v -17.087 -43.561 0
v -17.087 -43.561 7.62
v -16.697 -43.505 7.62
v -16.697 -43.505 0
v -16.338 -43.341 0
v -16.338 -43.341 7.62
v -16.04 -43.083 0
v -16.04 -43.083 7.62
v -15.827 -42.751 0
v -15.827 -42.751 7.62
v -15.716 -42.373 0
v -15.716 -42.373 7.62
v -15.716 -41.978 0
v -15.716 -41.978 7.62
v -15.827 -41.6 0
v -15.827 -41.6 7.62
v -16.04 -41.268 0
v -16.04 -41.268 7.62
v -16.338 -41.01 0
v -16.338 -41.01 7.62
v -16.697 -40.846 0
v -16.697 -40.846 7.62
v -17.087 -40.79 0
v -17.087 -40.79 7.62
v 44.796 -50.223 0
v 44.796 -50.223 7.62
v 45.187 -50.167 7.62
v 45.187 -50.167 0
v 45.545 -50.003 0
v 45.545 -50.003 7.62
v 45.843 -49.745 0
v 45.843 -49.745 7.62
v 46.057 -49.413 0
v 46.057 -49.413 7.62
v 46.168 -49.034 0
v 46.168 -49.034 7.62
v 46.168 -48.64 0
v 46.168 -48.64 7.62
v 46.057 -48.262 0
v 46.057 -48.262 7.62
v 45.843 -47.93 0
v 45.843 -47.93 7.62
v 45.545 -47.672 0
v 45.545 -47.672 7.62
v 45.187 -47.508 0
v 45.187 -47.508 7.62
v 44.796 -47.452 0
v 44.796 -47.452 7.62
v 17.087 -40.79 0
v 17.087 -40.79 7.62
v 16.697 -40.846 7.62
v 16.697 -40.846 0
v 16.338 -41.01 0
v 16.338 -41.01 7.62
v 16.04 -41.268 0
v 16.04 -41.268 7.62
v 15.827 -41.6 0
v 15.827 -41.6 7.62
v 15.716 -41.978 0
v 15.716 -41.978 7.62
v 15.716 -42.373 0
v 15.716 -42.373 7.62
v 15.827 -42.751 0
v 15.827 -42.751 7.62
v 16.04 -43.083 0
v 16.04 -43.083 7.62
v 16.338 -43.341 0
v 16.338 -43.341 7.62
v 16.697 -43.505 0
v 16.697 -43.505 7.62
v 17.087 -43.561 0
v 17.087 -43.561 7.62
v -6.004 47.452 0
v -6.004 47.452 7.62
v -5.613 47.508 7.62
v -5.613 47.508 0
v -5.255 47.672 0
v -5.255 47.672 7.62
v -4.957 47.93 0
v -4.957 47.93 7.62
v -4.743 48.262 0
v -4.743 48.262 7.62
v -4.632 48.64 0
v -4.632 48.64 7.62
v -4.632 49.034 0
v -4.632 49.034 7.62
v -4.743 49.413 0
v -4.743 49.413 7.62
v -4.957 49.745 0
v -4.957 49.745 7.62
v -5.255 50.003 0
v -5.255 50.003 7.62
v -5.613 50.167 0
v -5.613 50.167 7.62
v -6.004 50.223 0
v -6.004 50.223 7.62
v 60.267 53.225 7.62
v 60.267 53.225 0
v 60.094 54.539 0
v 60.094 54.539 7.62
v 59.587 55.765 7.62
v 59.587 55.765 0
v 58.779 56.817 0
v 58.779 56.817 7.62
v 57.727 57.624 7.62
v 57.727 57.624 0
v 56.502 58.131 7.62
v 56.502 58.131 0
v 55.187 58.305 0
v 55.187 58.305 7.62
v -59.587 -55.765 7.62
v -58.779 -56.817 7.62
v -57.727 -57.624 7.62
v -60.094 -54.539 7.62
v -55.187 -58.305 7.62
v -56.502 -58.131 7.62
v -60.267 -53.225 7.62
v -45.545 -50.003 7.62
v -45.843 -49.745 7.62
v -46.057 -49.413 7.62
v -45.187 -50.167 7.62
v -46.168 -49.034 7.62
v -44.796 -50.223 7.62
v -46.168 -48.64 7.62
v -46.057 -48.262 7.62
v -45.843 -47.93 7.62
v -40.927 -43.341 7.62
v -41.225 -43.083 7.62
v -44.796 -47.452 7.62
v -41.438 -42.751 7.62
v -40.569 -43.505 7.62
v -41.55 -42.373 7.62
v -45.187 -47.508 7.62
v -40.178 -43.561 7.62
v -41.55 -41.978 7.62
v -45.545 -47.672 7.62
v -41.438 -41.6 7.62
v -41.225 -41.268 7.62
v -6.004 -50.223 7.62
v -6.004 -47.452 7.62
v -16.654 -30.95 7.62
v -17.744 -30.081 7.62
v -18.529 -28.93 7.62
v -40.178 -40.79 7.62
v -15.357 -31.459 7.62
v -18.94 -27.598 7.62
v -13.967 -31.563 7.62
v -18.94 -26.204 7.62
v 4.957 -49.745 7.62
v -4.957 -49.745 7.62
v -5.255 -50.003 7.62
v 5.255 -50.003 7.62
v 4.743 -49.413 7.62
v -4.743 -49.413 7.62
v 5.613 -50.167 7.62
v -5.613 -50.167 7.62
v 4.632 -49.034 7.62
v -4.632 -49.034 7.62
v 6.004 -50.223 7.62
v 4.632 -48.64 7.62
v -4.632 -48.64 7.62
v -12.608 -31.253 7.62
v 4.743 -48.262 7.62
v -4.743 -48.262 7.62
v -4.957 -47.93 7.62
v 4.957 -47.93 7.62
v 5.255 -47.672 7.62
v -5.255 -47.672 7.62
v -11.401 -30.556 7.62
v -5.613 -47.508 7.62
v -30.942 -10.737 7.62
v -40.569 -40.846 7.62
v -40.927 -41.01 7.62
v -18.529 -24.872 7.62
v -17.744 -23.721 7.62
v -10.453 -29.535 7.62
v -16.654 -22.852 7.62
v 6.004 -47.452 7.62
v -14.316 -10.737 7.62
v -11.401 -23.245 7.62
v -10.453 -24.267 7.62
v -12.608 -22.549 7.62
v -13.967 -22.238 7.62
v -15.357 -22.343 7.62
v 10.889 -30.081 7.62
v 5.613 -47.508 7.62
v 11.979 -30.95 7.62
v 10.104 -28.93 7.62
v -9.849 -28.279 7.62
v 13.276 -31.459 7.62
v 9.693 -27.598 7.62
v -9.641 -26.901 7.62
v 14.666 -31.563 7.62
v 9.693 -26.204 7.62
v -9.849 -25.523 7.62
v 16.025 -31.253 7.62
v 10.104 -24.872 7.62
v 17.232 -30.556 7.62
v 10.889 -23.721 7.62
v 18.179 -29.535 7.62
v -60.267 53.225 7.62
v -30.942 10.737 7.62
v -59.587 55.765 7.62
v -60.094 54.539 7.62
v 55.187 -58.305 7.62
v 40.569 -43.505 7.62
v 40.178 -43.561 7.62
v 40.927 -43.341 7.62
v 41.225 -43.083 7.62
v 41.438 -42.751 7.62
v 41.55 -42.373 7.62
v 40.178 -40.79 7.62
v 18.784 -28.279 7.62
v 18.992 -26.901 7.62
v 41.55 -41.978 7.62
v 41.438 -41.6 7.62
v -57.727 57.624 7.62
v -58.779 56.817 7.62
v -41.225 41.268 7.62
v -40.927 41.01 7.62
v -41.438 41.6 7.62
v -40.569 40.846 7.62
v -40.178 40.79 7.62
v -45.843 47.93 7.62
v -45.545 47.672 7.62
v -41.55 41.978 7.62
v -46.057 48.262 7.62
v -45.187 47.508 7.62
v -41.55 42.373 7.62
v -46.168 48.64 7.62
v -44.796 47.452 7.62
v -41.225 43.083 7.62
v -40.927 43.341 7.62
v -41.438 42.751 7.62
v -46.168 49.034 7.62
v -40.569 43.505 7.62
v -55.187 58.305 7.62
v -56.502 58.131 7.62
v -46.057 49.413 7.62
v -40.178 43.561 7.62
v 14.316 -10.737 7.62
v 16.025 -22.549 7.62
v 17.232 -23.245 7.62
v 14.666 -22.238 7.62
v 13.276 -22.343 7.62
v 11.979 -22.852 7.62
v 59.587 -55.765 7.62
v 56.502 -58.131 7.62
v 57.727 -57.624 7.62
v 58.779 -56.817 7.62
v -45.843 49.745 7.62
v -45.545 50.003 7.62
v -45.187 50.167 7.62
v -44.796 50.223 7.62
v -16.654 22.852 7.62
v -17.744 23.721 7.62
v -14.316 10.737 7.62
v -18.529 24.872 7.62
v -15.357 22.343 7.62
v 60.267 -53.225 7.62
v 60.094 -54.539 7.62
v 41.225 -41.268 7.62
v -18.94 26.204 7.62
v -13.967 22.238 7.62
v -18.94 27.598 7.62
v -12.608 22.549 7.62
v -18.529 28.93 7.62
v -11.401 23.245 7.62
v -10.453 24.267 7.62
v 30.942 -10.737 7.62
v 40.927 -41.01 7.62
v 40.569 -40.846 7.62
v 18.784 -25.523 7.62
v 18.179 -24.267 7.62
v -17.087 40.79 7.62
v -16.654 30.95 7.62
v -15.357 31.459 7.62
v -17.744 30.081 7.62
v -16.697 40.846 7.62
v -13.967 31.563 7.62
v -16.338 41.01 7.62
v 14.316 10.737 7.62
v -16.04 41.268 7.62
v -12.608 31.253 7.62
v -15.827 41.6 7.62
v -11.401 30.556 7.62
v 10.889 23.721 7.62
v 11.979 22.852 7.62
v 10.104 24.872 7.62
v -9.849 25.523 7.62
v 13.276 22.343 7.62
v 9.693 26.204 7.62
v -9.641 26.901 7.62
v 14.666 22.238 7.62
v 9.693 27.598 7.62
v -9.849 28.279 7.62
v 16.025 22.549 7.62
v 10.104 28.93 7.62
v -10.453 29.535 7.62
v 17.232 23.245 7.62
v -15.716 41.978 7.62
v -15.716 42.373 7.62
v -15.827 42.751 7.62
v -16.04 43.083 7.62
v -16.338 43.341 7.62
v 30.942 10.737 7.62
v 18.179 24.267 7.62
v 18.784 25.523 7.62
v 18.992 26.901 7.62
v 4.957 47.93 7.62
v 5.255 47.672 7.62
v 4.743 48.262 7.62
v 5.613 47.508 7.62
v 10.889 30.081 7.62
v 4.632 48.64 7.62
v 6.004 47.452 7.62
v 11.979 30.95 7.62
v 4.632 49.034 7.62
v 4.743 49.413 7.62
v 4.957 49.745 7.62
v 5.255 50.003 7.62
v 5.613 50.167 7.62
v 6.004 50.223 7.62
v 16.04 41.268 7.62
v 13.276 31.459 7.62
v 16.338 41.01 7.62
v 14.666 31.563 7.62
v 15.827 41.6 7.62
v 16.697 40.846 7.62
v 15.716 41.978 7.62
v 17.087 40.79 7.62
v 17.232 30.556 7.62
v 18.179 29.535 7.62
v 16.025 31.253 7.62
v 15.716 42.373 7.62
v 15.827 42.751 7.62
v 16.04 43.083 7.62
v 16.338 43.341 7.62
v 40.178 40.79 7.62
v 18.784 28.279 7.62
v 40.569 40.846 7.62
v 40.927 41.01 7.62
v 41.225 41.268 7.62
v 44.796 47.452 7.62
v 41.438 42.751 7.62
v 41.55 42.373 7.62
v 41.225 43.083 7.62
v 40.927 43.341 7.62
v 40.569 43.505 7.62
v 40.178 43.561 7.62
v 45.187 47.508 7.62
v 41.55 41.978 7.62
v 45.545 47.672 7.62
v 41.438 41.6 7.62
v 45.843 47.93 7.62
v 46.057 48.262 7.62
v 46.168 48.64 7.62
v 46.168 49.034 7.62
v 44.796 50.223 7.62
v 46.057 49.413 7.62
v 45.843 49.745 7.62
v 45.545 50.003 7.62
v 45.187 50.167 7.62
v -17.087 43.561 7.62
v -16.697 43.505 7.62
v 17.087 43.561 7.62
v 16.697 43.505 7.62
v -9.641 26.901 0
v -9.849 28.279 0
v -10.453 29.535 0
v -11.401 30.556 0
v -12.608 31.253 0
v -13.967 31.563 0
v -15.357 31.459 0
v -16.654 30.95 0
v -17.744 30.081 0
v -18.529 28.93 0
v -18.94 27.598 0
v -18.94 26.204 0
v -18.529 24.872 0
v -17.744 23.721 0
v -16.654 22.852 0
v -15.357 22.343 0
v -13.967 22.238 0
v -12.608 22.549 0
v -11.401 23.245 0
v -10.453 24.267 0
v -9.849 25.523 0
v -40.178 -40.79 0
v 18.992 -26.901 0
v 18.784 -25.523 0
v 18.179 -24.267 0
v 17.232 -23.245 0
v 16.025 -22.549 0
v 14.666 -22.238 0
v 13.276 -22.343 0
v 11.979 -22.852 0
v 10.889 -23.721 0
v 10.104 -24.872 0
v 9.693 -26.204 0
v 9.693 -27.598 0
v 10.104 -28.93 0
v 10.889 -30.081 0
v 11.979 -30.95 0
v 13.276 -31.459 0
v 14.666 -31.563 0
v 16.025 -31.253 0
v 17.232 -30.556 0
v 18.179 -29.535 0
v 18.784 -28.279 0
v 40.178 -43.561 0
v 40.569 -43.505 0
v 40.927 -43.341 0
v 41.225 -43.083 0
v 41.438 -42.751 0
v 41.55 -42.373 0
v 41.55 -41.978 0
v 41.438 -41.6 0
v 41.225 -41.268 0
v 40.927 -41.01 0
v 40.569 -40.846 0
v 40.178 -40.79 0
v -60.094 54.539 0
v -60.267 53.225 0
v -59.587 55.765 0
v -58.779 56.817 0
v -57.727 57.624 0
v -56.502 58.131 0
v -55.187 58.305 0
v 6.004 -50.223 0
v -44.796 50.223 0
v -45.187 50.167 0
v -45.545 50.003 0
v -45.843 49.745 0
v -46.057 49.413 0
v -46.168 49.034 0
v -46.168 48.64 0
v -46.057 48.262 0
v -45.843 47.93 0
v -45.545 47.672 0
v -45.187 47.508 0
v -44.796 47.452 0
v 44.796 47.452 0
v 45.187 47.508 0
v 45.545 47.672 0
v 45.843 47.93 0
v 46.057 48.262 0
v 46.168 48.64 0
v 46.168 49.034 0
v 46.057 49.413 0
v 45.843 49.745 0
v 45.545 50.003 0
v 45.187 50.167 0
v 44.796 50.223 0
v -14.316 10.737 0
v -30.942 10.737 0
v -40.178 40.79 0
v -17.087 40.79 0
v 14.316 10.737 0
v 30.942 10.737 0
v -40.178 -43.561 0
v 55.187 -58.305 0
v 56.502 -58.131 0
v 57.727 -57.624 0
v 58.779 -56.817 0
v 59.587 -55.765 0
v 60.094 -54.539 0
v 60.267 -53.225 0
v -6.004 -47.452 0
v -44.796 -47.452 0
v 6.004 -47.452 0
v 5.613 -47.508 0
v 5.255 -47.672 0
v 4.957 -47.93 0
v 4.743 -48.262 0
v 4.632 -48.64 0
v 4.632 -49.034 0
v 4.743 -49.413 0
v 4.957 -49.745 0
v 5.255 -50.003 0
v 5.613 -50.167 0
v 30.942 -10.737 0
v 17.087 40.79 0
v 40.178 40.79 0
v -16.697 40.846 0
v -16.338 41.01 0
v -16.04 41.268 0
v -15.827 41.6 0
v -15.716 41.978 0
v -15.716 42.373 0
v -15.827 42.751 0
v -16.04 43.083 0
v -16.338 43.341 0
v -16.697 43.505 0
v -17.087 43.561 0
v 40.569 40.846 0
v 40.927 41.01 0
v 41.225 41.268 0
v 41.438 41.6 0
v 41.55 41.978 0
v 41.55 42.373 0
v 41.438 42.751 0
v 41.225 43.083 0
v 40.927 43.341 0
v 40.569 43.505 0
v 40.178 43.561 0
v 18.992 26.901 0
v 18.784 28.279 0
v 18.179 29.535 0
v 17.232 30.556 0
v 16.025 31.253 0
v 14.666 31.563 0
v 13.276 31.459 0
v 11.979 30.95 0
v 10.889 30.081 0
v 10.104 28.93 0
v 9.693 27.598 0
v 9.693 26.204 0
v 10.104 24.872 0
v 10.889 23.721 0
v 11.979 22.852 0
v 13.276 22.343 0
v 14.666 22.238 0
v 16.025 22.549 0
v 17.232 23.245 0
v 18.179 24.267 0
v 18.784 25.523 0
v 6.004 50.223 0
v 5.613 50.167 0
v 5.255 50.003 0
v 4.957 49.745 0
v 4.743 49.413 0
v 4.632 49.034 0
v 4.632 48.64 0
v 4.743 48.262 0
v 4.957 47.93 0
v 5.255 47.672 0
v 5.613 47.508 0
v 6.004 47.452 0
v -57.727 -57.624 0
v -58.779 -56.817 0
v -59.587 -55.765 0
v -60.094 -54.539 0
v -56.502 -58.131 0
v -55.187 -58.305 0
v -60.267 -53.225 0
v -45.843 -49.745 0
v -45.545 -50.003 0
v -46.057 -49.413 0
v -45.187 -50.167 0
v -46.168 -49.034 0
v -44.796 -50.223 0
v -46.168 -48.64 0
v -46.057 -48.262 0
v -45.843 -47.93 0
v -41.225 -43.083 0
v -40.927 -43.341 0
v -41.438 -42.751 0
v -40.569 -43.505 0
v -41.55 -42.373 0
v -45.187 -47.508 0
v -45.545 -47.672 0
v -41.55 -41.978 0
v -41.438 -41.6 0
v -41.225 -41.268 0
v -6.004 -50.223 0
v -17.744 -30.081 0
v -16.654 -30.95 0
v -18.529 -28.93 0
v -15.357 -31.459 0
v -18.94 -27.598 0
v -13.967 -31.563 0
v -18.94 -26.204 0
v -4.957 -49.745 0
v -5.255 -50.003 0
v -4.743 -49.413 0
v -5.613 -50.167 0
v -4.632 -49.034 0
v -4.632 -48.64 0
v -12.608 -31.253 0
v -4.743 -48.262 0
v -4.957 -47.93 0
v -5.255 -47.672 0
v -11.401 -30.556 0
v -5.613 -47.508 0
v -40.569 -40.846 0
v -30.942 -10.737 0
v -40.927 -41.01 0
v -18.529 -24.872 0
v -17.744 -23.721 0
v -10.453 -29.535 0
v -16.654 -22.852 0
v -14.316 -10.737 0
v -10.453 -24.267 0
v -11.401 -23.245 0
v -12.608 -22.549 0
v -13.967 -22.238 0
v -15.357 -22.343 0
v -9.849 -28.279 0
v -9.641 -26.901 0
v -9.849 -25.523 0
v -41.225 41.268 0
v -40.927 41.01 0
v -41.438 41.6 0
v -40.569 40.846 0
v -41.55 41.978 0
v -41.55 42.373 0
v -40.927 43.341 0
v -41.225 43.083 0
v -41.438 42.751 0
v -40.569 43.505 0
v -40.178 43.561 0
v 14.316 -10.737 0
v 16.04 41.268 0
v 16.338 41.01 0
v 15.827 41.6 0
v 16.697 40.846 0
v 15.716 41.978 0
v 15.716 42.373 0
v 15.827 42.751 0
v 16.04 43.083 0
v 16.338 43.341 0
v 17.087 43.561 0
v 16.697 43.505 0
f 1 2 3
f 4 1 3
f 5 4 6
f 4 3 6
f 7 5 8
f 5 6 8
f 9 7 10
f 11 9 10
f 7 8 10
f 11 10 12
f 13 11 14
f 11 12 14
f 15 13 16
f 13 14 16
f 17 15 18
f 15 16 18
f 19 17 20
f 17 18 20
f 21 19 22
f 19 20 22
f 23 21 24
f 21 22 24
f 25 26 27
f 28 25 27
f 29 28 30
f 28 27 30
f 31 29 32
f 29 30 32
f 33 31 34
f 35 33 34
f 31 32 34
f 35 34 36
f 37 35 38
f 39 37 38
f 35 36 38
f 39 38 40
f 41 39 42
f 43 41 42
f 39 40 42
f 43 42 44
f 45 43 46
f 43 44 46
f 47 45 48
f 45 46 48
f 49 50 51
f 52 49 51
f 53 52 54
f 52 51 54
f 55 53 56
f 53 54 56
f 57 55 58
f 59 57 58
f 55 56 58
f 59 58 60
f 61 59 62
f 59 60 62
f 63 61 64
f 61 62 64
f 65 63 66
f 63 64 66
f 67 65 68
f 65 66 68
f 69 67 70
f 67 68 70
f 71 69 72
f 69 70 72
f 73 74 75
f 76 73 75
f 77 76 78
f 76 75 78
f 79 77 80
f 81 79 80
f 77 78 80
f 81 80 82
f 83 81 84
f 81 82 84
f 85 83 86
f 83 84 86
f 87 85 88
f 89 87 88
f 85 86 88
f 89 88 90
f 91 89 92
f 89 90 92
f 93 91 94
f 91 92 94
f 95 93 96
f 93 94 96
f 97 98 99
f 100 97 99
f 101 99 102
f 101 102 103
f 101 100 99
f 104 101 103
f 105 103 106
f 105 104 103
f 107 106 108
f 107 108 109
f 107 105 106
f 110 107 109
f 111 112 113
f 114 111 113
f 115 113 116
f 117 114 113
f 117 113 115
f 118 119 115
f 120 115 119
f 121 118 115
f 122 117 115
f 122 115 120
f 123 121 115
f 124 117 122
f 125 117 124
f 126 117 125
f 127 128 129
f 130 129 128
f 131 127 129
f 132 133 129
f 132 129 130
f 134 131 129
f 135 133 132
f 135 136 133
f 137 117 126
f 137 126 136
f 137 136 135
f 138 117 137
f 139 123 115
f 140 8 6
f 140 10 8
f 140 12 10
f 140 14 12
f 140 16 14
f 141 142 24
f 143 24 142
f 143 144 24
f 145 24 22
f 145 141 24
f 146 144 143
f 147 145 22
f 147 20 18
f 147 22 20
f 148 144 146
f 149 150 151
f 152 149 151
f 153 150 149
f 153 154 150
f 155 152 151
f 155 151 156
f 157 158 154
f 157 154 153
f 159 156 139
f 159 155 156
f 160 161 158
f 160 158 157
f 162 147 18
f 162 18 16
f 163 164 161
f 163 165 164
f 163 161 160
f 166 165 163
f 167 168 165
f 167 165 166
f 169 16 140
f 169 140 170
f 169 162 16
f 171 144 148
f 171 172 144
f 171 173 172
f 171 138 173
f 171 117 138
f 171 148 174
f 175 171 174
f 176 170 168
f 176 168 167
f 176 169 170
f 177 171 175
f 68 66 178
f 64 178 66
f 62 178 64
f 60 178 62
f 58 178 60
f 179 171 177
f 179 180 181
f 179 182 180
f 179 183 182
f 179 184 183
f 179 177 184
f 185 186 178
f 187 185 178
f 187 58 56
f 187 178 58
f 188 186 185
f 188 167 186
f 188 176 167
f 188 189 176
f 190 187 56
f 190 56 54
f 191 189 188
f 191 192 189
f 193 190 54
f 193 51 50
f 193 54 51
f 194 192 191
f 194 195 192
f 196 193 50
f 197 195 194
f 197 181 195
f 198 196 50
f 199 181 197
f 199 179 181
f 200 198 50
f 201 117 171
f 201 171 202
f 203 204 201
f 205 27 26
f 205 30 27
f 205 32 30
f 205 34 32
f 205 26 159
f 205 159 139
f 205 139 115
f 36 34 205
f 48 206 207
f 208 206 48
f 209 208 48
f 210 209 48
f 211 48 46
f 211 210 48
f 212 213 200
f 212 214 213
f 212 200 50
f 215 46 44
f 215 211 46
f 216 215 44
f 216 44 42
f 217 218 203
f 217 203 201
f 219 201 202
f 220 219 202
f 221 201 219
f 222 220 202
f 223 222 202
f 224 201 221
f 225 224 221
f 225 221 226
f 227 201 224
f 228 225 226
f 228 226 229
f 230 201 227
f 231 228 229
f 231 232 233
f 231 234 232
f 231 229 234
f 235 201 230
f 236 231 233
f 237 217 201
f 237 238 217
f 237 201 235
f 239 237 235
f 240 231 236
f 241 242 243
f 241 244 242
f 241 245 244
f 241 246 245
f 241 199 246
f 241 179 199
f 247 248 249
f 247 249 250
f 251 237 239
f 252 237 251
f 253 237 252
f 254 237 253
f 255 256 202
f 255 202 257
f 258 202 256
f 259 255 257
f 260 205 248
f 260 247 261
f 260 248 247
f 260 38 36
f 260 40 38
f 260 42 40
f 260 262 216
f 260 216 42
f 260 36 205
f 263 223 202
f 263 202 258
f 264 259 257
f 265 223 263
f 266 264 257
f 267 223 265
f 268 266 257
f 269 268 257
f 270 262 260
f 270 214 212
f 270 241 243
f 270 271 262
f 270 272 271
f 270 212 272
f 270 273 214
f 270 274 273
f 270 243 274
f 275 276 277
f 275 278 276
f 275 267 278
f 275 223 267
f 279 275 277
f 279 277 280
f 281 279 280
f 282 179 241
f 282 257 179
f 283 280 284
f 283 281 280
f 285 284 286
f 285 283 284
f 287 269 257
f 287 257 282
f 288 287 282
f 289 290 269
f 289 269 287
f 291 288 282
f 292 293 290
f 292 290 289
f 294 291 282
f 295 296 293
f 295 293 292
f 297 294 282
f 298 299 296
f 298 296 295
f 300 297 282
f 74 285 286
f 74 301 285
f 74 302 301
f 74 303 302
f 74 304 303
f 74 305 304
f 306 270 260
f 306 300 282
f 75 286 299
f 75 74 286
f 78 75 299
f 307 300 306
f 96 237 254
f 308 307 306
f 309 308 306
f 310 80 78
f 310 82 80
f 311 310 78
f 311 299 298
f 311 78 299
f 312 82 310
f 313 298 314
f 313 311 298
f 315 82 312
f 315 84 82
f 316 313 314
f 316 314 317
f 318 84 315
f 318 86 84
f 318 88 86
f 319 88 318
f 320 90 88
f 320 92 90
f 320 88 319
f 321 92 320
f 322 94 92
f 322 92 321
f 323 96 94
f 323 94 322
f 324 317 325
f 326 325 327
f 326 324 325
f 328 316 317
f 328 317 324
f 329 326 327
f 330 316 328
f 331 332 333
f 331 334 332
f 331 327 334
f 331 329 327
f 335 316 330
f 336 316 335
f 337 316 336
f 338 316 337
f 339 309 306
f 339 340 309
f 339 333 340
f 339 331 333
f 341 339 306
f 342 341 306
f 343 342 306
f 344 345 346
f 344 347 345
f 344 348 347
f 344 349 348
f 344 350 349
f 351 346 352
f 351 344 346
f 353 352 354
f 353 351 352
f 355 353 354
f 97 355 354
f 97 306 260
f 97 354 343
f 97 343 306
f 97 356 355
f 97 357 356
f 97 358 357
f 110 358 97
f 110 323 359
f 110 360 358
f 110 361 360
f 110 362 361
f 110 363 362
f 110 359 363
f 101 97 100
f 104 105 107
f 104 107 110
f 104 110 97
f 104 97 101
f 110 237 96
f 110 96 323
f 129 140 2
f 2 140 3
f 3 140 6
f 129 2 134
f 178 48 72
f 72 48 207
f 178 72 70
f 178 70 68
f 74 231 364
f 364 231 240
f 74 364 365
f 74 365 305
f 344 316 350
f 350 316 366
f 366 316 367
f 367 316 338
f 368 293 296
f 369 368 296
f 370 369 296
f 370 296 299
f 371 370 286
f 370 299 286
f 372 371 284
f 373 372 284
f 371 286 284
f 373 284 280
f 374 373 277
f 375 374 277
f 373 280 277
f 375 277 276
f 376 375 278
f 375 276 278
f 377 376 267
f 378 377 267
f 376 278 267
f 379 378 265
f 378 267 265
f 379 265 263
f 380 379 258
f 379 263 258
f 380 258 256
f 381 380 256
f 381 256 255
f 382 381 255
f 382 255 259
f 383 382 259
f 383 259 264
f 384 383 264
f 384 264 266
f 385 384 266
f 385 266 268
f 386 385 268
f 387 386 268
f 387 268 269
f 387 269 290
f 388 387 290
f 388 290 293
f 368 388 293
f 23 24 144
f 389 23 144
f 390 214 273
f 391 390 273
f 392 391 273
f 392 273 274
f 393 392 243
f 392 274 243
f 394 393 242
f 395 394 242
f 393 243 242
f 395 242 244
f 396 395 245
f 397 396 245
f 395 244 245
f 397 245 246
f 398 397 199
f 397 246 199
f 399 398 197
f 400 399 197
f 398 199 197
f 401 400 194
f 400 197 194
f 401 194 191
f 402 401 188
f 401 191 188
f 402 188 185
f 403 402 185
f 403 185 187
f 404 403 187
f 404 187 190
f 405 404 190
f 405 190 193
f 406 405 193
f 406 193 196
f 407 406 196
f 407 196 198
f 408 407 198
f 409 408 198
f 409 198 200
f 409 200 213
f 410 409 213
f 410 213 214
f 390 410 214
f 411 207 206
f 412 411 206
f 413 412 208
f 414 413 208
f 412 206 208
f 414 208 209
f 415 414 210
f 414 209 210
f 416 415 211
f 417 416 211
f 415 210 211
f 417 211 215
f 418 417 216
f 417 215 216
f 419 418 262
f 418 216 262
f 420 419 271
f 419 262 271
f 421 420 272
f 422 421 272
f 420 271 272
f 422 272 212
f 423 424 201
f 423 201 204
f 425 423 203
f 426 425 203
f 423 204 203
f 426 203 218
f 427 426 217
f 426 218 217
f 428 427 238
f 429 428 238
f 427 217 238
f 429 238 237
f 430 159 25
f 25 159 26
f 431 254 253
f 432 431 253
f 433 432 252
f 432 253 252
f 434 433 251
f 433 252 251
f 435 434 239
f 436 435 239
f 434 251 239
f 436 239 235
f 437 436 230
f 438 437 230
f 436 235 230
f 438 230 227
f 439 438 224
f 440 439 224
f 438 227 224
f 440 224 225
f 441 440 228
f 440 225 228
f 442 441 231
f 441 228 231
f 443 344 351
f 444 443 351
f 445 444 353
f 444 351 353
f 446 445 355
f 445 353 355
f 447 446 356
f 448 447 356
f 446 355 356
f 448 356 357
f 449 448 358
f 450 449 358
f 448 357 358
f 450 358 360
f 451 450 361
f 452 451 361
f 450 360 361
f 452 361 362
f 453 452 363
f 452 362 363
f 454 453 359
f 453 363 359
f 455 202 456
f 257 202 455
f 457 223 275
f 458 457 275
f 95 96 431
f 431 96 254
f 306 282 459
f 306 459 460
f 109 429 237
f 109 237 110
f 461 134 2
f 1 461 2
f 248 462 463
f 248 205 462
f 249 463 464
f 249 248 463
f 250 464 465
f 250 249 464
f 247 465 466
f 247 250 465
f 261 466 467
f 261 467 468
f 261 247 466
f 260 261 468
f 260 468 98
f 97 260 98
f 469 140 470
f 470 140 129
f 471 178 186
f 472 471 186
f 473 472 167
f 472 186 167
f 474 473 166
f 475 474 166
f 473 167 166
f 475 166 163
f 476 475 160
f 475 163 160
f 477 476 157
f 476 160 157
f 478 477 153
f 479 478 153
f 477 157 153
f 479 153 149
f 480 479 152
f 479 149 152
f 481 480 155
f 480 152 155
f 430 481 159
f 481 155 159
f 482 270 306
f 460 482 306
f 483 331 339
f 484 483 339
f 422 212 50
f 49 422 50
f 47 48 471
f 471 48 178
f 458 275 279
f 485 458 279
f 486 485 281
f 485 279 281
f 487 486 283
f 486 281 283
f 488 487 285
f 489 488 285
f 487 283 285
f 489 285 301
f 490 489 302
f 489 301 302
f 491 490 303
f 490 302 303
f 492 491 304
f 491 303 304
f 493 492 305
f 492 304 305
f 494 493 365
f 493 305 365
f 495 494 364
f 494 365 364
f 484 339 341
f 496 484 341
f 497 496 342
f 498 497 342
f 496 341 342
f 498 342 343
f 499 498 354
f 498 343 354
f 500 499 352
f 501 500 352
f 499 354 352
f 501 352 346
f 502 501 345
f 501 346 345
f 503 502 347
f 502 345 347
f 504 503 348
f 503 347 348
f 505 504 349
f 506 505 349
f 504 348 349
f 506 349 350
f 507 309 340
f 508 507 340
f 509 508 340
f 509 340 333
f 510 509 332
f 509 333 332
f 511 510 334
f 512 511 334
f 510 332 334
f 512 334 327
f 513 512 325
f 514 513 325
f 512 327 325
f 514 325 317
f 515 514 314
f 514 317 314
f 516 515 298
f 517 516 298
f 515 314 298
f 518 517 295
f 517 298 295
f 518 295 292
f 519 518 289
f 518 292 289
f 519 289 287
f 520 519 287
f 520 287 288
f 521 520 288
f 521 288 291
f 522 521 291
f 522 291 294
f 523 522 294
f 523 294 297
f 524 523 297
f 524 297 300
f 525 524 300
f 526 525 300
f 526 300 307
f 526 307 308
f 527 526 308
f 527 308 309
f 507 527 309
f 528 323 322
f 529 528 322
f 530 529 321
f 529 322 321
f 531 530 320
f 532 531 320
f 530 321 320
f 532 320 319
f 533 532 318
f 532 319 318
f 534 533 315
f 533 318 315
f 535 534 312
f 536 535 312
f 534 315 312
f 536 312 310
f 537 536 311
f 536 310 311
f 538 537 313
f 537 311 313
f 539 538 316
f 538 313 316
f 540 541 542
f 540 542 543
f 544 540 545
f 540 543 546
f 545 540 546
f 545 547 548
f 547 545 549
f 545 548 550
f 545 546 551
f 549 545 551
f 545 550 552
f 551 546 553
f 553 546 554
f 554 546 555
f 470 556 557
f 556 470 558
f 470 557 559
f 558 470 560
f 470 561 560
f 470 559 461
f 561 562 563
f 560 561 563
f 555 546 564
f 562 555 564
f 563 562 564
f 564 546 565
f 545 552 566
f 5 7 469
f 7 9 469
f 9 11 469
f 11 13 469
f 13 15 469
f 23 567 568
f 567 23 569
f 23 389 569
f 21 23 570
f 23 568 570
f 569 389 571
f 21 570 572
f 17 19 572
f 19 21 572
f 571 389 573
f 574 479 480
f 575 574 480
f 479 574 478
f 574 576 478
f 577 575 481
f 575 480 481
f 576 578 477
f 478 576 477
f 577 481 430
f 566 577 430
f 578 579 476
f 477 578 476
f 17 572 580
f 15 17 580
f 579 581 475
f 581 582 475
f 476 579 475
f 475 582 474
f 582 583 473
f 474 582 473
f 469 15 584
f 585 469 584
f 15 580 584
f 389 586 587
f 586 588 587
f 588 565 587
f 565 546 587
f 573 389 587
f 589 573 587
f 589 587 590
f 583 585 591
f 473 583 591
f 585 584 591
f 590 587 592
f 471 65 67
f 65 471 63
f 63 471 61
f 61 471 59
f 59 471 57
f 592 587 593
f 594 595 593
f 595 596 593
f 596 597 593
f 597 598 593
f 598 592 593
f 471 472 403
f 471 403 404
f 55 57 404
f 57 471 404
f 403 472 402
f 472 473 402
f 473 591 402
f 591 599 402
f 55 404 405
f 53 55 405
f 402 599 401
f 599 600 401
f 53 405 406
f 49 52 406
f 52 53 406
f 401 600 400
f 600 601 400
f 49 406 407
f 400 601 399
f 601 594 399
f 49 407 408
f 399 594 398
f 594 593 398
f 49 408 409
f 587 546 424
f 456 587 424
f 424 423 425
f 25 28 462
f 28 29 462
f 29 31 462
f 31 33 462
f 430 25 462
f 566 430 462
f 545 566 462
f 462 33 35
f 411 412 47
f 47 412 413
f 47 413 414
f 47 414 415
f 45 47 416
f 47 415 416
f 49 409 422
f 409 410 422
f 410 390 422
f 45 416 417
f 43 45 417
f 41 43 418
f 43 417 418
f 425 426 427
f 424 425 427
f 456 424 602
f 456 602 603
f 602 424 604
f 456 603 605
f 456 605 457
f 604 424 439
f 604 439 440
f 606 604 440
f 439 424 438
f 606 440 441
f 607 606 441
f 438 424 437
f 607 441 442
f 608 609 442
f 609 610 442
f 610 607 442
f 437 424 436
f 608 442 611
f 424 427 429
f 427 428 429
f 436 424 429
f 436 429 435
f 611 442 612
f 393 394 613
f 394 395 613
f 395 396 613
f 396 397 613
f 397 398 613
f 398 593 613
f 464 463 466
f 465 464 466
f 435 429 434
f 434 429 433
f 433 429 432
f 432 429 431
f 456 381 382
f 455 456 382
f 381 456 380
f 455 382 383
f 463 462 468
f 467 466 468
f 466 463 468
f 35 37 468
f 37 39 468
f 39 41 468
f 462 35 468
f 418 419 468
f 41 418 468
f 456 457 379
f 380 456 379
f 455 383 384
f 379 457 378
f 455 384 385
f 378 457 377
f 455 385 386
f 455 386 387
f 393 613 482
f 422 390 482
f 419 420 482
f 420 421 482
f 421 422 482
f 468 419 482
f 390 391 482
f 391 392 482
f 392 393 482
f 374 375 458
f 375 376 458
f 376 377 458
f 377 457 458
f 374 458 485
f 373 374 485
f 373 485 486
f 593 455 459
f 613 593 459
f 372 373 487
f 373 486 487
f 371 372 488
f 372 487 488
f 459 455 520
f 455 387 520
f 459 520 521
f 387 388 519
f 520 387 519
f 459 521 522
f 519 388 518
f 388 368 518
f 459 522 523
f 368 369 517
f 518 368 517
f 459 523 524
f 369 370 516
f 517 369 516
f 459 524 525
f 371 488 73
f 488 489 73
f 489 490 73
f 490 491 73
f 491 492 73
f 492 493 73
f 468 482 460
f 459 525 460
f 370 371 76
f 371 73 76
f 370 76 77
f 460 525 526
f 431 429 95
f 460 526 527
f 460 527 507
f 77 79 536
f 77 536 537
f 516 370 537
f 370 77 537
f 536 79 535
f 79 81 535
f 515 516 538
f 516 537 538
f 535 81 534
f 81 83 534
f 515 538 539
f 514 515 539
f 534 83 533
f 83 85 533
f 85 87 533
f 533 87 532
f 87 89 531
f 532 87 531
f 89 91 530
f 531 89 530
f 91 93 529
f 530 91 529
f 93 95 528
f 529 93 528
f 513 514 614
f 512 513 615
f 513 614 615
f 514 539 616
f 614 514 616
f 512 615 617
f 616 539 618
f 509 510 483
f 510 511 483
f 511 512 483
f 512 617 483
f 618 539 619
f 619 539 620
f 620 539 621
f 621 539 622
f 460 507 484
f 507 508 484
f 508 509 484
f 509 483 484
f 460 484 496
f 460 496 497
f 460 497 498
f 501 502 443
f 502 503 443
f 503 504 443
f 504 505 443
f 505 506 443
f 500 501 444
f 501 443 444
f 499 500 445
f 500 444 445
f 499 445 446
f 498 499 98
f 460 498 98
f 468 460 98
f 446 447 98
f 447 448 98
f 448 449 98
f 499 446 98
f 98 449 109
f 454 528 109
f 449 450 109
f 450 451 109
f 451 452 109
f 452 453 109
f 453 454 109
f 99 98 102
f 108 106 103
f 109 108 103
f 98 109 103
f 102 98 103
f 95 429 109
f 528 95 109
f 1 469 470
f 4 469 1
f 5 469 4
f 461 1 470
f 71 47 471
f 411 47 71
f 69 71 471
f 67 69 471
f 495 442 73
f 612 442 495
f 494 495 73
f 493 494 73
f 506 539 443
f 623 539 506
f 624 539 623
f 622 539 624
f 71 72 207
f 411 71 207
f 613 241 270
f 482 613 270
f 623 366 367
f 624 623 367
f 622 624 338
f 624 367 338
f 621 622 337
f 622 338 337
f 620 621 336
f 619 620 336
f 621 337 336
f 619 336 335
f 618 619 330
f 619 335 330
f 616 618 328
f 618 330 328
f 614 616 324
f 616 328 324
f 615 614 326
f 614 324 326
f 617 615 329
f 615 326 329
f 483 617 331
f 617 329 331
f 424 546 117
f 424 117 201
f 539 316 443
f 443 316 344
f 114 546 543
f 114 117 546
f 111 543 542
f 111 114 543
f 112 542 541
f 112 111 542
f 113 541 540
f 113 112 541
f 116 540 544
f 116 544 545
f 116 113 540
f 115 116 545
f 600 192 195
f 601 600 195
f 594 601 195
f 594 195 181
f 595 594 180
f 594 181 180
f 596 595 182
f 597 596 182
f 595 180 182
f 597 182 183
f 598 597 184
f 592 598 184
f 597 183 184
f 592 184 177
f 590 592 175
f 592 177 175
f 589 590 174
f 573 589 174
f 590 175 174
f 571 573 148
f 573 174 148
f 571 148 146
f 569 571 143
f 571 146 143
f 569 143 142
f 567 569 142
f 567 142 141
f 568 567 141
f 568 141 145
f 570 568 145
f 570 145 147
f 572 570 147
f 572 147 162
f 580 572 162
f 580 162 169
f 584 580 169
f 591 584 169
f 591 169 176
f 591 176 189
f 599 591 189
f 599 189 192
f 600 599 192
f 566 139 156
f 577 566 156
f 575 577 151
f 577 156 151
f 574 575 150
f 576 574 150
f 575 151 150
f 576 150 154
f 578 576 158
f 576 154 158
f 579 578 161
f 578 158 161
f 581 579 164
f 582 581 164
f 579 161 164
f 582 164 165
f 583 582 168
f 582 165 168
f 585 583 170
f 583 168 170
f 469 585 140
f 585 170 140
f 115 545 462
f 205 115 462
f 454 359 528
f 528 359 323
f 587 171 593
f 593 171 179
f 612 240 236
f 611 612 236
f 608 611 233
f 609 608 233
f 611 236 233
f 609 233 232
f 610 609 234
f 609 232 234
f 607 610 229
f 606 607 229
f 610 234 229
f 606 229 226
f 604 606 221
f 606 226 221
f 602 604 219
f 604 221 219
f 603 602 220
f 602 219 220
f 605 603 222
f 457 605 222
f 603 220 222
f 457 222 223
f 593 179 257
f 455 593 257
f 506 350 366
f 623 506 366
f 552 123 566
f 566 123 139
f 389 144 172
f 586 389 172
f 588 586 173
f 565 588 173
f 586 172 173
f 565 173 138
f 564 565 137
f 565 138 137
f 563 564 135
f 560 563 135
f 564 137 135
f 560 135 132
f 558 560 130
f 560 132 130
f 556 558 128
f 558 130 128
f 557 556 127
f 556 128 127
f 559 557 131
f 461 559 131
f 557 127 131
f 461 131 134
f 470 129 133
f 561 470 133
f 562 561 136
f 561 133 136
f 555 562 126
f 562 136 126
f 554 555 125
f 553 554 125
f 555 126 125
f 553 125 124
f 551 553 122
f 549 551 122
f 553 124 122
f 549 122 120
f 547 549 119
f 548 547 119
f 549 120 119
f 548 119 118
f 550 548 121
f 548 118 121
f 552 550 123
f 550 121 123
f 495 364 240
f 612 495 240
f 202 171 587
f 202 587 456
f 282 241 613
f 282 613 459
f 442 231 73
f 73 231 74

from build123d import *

# Parameters (mm, degrees)
F0_W     = 120.534546
F0_H     = 116.60909
F1_DEPTH = 7.62
F2_R     = 5.08
F3_W     = 16.625449
F3_H     = 21.474546
F3_R     = 4.675549
F4_DEPTH = 25.4


with BuildPart() as f1:
    # F0 (on Top) → F1 (new body)
    with BuildSketch(Plane.XY):
        Rectangle(F0_W, F0_H)
    extrude(amount=F1_DEPTH)

    # F2
    f2_edges = [f1.edges().sort_by_distance(p)[0] for p in [
        (60.267273, -58.304545, 3.81),
        (-60.267273, -58.304545, 3.81),
        (-60.267273, 58.304545, 3.81),
        (60.267273, 58.304545, 3.81),
    ]]
    fillet(f2_edges, radius=F2_R)

    # F3 (on face) → F4 (cut)
    with BuildSketch(Plane.XY.offset(7.62)):
        with Locations((-22.629092, 0)):
            Rectangle(F3_W, F3_H)
        with Locations((22.629092, 0)):
            Rectangle(F3_W, F3_H)
        with Locations((-14.316367, 26.90091)):
            Circle(F3_R)
        with BuildLine():
            Line((40.178183, 43.560948), (17.087273, 43.560948))
            ThreePointArc((17.087273, 43.560948), (15.701819, 42.175494), (17.087273, 40.79004))
            Line((17.087273, 40.79004), (40.178183, 40.79004))
            ThreePointArc((40.178183, 40.79004), (41.563638, 42.175494), (40.178183, 43.560948))
        make_face()
        with BuildLine():
            Line((44.796359, 50.222728), (6.003633, 50.222728))
            ThreePointArc((6.003633, 50.222728), (4.618179, 48.837274), (6.003633, 47.45182))
            Line((6.003633, 47.45182), (44.796359, 47.45182))
            ThreePointArc((44.796359, 47.45182), (46.181813, 48.837274), (44.796359, 50.222728))
        make_face()
        with BuildLine():
            ThreePointArc((-6.003633, 47.45182), (-4.618179, 48.837274), (-6.003633, 50.222728))
            Line((-6.003633, 50.222728), (-44.796359, 50.222728))
            ThreePointArc((-44.796359, 50.222728), (-46.181813, 48.837274), (-44.796359, 47.45182))
            Line((-44.796359, 47.45182), (-6.003633, 47.45182))
        make_face()
        with BuildLine():
            ThreePointArc((-17.087273, 40.79004), (-15.701819, 42.175494), (-17.087273, 43.560948))
            Line((-17.087273, 43.560948), (-40.178183, 43.560948))
            ThreePointArc((-40.178183, 43.560948), (-41.563638, 42.175494), (-40.178183, 40.79004))
            Line((-40.178183, 40.79004), (-17.087273, 40.79004))
        make_face()
        with BuildLine():
            ThreePointArc((17.087273, -40.79004), (15.701819, -42.175494), (17.087273, -43.560948))
            Line((17.087273, -43.560948), (40.178183, -43.560948))
            ThreePointArc((40.178183, -43.560948), (41.563638, -42.175494), (40.178183, -40.79004))
            Line((40.178183, -40.79004), (17.087273, -40.79004))
        make_face()
        with BuildLine():
            ThreePointArc((-17.087273, -43.560948), (-15.701819, -42.175494), (-17.087273, -40.79004))
            Line((-17.087273, -40.79004), (-40.178183, -40.79004))
            ThreePointArc((-40.178183, -40.79004), (-41.563638, -42.175494), (-40.178183, -43.560948))
            Line((-40.178183, -43.560948), (-17.087273, -43.560948))
        make_face()
        with BuildLine():
            ThreePointArc((-6.003633, -50.222728), (-4.618179, -48.837274), (-6.003633, -47.45182))
            Line((-6.003633, -47.45182), (-44.796359, -47.45182))
            ThreePointArc((-44.796359, -47.45182), (-46.181813, -48.837274), (-44.796359, -50.222728))
            Line((-44.796359, -50.222728), (-6.003633, -50.222728))
        make_face()
        with BuildLine():
            ThreePointArc((6.003633, -47.45182), (4.618179, -48.837274), (6.003633, -50.222728))
            Line((6.003633, -50.222728), (44.796359, -50.222728))
            ThreePointArc((44.796359, -50.222728), (46.181813, -48.837274), (44.796359, -47.45182))
            Line((44.796359, -47.45182), (6.003633, -47.45182))
        make_face()
        with Locations((-14.316367, -26.90091)):
            Circle(F3_R)
        with Locations((14.316367, -26.90091)):
            Circle(F3_R)
        with Locations((14.316367, 26.90091)):
            Circle(F3_R)
    extrude(amount=-F4_DEPTH, mode=Mode.SUBTRACT)


solid = f1.part
